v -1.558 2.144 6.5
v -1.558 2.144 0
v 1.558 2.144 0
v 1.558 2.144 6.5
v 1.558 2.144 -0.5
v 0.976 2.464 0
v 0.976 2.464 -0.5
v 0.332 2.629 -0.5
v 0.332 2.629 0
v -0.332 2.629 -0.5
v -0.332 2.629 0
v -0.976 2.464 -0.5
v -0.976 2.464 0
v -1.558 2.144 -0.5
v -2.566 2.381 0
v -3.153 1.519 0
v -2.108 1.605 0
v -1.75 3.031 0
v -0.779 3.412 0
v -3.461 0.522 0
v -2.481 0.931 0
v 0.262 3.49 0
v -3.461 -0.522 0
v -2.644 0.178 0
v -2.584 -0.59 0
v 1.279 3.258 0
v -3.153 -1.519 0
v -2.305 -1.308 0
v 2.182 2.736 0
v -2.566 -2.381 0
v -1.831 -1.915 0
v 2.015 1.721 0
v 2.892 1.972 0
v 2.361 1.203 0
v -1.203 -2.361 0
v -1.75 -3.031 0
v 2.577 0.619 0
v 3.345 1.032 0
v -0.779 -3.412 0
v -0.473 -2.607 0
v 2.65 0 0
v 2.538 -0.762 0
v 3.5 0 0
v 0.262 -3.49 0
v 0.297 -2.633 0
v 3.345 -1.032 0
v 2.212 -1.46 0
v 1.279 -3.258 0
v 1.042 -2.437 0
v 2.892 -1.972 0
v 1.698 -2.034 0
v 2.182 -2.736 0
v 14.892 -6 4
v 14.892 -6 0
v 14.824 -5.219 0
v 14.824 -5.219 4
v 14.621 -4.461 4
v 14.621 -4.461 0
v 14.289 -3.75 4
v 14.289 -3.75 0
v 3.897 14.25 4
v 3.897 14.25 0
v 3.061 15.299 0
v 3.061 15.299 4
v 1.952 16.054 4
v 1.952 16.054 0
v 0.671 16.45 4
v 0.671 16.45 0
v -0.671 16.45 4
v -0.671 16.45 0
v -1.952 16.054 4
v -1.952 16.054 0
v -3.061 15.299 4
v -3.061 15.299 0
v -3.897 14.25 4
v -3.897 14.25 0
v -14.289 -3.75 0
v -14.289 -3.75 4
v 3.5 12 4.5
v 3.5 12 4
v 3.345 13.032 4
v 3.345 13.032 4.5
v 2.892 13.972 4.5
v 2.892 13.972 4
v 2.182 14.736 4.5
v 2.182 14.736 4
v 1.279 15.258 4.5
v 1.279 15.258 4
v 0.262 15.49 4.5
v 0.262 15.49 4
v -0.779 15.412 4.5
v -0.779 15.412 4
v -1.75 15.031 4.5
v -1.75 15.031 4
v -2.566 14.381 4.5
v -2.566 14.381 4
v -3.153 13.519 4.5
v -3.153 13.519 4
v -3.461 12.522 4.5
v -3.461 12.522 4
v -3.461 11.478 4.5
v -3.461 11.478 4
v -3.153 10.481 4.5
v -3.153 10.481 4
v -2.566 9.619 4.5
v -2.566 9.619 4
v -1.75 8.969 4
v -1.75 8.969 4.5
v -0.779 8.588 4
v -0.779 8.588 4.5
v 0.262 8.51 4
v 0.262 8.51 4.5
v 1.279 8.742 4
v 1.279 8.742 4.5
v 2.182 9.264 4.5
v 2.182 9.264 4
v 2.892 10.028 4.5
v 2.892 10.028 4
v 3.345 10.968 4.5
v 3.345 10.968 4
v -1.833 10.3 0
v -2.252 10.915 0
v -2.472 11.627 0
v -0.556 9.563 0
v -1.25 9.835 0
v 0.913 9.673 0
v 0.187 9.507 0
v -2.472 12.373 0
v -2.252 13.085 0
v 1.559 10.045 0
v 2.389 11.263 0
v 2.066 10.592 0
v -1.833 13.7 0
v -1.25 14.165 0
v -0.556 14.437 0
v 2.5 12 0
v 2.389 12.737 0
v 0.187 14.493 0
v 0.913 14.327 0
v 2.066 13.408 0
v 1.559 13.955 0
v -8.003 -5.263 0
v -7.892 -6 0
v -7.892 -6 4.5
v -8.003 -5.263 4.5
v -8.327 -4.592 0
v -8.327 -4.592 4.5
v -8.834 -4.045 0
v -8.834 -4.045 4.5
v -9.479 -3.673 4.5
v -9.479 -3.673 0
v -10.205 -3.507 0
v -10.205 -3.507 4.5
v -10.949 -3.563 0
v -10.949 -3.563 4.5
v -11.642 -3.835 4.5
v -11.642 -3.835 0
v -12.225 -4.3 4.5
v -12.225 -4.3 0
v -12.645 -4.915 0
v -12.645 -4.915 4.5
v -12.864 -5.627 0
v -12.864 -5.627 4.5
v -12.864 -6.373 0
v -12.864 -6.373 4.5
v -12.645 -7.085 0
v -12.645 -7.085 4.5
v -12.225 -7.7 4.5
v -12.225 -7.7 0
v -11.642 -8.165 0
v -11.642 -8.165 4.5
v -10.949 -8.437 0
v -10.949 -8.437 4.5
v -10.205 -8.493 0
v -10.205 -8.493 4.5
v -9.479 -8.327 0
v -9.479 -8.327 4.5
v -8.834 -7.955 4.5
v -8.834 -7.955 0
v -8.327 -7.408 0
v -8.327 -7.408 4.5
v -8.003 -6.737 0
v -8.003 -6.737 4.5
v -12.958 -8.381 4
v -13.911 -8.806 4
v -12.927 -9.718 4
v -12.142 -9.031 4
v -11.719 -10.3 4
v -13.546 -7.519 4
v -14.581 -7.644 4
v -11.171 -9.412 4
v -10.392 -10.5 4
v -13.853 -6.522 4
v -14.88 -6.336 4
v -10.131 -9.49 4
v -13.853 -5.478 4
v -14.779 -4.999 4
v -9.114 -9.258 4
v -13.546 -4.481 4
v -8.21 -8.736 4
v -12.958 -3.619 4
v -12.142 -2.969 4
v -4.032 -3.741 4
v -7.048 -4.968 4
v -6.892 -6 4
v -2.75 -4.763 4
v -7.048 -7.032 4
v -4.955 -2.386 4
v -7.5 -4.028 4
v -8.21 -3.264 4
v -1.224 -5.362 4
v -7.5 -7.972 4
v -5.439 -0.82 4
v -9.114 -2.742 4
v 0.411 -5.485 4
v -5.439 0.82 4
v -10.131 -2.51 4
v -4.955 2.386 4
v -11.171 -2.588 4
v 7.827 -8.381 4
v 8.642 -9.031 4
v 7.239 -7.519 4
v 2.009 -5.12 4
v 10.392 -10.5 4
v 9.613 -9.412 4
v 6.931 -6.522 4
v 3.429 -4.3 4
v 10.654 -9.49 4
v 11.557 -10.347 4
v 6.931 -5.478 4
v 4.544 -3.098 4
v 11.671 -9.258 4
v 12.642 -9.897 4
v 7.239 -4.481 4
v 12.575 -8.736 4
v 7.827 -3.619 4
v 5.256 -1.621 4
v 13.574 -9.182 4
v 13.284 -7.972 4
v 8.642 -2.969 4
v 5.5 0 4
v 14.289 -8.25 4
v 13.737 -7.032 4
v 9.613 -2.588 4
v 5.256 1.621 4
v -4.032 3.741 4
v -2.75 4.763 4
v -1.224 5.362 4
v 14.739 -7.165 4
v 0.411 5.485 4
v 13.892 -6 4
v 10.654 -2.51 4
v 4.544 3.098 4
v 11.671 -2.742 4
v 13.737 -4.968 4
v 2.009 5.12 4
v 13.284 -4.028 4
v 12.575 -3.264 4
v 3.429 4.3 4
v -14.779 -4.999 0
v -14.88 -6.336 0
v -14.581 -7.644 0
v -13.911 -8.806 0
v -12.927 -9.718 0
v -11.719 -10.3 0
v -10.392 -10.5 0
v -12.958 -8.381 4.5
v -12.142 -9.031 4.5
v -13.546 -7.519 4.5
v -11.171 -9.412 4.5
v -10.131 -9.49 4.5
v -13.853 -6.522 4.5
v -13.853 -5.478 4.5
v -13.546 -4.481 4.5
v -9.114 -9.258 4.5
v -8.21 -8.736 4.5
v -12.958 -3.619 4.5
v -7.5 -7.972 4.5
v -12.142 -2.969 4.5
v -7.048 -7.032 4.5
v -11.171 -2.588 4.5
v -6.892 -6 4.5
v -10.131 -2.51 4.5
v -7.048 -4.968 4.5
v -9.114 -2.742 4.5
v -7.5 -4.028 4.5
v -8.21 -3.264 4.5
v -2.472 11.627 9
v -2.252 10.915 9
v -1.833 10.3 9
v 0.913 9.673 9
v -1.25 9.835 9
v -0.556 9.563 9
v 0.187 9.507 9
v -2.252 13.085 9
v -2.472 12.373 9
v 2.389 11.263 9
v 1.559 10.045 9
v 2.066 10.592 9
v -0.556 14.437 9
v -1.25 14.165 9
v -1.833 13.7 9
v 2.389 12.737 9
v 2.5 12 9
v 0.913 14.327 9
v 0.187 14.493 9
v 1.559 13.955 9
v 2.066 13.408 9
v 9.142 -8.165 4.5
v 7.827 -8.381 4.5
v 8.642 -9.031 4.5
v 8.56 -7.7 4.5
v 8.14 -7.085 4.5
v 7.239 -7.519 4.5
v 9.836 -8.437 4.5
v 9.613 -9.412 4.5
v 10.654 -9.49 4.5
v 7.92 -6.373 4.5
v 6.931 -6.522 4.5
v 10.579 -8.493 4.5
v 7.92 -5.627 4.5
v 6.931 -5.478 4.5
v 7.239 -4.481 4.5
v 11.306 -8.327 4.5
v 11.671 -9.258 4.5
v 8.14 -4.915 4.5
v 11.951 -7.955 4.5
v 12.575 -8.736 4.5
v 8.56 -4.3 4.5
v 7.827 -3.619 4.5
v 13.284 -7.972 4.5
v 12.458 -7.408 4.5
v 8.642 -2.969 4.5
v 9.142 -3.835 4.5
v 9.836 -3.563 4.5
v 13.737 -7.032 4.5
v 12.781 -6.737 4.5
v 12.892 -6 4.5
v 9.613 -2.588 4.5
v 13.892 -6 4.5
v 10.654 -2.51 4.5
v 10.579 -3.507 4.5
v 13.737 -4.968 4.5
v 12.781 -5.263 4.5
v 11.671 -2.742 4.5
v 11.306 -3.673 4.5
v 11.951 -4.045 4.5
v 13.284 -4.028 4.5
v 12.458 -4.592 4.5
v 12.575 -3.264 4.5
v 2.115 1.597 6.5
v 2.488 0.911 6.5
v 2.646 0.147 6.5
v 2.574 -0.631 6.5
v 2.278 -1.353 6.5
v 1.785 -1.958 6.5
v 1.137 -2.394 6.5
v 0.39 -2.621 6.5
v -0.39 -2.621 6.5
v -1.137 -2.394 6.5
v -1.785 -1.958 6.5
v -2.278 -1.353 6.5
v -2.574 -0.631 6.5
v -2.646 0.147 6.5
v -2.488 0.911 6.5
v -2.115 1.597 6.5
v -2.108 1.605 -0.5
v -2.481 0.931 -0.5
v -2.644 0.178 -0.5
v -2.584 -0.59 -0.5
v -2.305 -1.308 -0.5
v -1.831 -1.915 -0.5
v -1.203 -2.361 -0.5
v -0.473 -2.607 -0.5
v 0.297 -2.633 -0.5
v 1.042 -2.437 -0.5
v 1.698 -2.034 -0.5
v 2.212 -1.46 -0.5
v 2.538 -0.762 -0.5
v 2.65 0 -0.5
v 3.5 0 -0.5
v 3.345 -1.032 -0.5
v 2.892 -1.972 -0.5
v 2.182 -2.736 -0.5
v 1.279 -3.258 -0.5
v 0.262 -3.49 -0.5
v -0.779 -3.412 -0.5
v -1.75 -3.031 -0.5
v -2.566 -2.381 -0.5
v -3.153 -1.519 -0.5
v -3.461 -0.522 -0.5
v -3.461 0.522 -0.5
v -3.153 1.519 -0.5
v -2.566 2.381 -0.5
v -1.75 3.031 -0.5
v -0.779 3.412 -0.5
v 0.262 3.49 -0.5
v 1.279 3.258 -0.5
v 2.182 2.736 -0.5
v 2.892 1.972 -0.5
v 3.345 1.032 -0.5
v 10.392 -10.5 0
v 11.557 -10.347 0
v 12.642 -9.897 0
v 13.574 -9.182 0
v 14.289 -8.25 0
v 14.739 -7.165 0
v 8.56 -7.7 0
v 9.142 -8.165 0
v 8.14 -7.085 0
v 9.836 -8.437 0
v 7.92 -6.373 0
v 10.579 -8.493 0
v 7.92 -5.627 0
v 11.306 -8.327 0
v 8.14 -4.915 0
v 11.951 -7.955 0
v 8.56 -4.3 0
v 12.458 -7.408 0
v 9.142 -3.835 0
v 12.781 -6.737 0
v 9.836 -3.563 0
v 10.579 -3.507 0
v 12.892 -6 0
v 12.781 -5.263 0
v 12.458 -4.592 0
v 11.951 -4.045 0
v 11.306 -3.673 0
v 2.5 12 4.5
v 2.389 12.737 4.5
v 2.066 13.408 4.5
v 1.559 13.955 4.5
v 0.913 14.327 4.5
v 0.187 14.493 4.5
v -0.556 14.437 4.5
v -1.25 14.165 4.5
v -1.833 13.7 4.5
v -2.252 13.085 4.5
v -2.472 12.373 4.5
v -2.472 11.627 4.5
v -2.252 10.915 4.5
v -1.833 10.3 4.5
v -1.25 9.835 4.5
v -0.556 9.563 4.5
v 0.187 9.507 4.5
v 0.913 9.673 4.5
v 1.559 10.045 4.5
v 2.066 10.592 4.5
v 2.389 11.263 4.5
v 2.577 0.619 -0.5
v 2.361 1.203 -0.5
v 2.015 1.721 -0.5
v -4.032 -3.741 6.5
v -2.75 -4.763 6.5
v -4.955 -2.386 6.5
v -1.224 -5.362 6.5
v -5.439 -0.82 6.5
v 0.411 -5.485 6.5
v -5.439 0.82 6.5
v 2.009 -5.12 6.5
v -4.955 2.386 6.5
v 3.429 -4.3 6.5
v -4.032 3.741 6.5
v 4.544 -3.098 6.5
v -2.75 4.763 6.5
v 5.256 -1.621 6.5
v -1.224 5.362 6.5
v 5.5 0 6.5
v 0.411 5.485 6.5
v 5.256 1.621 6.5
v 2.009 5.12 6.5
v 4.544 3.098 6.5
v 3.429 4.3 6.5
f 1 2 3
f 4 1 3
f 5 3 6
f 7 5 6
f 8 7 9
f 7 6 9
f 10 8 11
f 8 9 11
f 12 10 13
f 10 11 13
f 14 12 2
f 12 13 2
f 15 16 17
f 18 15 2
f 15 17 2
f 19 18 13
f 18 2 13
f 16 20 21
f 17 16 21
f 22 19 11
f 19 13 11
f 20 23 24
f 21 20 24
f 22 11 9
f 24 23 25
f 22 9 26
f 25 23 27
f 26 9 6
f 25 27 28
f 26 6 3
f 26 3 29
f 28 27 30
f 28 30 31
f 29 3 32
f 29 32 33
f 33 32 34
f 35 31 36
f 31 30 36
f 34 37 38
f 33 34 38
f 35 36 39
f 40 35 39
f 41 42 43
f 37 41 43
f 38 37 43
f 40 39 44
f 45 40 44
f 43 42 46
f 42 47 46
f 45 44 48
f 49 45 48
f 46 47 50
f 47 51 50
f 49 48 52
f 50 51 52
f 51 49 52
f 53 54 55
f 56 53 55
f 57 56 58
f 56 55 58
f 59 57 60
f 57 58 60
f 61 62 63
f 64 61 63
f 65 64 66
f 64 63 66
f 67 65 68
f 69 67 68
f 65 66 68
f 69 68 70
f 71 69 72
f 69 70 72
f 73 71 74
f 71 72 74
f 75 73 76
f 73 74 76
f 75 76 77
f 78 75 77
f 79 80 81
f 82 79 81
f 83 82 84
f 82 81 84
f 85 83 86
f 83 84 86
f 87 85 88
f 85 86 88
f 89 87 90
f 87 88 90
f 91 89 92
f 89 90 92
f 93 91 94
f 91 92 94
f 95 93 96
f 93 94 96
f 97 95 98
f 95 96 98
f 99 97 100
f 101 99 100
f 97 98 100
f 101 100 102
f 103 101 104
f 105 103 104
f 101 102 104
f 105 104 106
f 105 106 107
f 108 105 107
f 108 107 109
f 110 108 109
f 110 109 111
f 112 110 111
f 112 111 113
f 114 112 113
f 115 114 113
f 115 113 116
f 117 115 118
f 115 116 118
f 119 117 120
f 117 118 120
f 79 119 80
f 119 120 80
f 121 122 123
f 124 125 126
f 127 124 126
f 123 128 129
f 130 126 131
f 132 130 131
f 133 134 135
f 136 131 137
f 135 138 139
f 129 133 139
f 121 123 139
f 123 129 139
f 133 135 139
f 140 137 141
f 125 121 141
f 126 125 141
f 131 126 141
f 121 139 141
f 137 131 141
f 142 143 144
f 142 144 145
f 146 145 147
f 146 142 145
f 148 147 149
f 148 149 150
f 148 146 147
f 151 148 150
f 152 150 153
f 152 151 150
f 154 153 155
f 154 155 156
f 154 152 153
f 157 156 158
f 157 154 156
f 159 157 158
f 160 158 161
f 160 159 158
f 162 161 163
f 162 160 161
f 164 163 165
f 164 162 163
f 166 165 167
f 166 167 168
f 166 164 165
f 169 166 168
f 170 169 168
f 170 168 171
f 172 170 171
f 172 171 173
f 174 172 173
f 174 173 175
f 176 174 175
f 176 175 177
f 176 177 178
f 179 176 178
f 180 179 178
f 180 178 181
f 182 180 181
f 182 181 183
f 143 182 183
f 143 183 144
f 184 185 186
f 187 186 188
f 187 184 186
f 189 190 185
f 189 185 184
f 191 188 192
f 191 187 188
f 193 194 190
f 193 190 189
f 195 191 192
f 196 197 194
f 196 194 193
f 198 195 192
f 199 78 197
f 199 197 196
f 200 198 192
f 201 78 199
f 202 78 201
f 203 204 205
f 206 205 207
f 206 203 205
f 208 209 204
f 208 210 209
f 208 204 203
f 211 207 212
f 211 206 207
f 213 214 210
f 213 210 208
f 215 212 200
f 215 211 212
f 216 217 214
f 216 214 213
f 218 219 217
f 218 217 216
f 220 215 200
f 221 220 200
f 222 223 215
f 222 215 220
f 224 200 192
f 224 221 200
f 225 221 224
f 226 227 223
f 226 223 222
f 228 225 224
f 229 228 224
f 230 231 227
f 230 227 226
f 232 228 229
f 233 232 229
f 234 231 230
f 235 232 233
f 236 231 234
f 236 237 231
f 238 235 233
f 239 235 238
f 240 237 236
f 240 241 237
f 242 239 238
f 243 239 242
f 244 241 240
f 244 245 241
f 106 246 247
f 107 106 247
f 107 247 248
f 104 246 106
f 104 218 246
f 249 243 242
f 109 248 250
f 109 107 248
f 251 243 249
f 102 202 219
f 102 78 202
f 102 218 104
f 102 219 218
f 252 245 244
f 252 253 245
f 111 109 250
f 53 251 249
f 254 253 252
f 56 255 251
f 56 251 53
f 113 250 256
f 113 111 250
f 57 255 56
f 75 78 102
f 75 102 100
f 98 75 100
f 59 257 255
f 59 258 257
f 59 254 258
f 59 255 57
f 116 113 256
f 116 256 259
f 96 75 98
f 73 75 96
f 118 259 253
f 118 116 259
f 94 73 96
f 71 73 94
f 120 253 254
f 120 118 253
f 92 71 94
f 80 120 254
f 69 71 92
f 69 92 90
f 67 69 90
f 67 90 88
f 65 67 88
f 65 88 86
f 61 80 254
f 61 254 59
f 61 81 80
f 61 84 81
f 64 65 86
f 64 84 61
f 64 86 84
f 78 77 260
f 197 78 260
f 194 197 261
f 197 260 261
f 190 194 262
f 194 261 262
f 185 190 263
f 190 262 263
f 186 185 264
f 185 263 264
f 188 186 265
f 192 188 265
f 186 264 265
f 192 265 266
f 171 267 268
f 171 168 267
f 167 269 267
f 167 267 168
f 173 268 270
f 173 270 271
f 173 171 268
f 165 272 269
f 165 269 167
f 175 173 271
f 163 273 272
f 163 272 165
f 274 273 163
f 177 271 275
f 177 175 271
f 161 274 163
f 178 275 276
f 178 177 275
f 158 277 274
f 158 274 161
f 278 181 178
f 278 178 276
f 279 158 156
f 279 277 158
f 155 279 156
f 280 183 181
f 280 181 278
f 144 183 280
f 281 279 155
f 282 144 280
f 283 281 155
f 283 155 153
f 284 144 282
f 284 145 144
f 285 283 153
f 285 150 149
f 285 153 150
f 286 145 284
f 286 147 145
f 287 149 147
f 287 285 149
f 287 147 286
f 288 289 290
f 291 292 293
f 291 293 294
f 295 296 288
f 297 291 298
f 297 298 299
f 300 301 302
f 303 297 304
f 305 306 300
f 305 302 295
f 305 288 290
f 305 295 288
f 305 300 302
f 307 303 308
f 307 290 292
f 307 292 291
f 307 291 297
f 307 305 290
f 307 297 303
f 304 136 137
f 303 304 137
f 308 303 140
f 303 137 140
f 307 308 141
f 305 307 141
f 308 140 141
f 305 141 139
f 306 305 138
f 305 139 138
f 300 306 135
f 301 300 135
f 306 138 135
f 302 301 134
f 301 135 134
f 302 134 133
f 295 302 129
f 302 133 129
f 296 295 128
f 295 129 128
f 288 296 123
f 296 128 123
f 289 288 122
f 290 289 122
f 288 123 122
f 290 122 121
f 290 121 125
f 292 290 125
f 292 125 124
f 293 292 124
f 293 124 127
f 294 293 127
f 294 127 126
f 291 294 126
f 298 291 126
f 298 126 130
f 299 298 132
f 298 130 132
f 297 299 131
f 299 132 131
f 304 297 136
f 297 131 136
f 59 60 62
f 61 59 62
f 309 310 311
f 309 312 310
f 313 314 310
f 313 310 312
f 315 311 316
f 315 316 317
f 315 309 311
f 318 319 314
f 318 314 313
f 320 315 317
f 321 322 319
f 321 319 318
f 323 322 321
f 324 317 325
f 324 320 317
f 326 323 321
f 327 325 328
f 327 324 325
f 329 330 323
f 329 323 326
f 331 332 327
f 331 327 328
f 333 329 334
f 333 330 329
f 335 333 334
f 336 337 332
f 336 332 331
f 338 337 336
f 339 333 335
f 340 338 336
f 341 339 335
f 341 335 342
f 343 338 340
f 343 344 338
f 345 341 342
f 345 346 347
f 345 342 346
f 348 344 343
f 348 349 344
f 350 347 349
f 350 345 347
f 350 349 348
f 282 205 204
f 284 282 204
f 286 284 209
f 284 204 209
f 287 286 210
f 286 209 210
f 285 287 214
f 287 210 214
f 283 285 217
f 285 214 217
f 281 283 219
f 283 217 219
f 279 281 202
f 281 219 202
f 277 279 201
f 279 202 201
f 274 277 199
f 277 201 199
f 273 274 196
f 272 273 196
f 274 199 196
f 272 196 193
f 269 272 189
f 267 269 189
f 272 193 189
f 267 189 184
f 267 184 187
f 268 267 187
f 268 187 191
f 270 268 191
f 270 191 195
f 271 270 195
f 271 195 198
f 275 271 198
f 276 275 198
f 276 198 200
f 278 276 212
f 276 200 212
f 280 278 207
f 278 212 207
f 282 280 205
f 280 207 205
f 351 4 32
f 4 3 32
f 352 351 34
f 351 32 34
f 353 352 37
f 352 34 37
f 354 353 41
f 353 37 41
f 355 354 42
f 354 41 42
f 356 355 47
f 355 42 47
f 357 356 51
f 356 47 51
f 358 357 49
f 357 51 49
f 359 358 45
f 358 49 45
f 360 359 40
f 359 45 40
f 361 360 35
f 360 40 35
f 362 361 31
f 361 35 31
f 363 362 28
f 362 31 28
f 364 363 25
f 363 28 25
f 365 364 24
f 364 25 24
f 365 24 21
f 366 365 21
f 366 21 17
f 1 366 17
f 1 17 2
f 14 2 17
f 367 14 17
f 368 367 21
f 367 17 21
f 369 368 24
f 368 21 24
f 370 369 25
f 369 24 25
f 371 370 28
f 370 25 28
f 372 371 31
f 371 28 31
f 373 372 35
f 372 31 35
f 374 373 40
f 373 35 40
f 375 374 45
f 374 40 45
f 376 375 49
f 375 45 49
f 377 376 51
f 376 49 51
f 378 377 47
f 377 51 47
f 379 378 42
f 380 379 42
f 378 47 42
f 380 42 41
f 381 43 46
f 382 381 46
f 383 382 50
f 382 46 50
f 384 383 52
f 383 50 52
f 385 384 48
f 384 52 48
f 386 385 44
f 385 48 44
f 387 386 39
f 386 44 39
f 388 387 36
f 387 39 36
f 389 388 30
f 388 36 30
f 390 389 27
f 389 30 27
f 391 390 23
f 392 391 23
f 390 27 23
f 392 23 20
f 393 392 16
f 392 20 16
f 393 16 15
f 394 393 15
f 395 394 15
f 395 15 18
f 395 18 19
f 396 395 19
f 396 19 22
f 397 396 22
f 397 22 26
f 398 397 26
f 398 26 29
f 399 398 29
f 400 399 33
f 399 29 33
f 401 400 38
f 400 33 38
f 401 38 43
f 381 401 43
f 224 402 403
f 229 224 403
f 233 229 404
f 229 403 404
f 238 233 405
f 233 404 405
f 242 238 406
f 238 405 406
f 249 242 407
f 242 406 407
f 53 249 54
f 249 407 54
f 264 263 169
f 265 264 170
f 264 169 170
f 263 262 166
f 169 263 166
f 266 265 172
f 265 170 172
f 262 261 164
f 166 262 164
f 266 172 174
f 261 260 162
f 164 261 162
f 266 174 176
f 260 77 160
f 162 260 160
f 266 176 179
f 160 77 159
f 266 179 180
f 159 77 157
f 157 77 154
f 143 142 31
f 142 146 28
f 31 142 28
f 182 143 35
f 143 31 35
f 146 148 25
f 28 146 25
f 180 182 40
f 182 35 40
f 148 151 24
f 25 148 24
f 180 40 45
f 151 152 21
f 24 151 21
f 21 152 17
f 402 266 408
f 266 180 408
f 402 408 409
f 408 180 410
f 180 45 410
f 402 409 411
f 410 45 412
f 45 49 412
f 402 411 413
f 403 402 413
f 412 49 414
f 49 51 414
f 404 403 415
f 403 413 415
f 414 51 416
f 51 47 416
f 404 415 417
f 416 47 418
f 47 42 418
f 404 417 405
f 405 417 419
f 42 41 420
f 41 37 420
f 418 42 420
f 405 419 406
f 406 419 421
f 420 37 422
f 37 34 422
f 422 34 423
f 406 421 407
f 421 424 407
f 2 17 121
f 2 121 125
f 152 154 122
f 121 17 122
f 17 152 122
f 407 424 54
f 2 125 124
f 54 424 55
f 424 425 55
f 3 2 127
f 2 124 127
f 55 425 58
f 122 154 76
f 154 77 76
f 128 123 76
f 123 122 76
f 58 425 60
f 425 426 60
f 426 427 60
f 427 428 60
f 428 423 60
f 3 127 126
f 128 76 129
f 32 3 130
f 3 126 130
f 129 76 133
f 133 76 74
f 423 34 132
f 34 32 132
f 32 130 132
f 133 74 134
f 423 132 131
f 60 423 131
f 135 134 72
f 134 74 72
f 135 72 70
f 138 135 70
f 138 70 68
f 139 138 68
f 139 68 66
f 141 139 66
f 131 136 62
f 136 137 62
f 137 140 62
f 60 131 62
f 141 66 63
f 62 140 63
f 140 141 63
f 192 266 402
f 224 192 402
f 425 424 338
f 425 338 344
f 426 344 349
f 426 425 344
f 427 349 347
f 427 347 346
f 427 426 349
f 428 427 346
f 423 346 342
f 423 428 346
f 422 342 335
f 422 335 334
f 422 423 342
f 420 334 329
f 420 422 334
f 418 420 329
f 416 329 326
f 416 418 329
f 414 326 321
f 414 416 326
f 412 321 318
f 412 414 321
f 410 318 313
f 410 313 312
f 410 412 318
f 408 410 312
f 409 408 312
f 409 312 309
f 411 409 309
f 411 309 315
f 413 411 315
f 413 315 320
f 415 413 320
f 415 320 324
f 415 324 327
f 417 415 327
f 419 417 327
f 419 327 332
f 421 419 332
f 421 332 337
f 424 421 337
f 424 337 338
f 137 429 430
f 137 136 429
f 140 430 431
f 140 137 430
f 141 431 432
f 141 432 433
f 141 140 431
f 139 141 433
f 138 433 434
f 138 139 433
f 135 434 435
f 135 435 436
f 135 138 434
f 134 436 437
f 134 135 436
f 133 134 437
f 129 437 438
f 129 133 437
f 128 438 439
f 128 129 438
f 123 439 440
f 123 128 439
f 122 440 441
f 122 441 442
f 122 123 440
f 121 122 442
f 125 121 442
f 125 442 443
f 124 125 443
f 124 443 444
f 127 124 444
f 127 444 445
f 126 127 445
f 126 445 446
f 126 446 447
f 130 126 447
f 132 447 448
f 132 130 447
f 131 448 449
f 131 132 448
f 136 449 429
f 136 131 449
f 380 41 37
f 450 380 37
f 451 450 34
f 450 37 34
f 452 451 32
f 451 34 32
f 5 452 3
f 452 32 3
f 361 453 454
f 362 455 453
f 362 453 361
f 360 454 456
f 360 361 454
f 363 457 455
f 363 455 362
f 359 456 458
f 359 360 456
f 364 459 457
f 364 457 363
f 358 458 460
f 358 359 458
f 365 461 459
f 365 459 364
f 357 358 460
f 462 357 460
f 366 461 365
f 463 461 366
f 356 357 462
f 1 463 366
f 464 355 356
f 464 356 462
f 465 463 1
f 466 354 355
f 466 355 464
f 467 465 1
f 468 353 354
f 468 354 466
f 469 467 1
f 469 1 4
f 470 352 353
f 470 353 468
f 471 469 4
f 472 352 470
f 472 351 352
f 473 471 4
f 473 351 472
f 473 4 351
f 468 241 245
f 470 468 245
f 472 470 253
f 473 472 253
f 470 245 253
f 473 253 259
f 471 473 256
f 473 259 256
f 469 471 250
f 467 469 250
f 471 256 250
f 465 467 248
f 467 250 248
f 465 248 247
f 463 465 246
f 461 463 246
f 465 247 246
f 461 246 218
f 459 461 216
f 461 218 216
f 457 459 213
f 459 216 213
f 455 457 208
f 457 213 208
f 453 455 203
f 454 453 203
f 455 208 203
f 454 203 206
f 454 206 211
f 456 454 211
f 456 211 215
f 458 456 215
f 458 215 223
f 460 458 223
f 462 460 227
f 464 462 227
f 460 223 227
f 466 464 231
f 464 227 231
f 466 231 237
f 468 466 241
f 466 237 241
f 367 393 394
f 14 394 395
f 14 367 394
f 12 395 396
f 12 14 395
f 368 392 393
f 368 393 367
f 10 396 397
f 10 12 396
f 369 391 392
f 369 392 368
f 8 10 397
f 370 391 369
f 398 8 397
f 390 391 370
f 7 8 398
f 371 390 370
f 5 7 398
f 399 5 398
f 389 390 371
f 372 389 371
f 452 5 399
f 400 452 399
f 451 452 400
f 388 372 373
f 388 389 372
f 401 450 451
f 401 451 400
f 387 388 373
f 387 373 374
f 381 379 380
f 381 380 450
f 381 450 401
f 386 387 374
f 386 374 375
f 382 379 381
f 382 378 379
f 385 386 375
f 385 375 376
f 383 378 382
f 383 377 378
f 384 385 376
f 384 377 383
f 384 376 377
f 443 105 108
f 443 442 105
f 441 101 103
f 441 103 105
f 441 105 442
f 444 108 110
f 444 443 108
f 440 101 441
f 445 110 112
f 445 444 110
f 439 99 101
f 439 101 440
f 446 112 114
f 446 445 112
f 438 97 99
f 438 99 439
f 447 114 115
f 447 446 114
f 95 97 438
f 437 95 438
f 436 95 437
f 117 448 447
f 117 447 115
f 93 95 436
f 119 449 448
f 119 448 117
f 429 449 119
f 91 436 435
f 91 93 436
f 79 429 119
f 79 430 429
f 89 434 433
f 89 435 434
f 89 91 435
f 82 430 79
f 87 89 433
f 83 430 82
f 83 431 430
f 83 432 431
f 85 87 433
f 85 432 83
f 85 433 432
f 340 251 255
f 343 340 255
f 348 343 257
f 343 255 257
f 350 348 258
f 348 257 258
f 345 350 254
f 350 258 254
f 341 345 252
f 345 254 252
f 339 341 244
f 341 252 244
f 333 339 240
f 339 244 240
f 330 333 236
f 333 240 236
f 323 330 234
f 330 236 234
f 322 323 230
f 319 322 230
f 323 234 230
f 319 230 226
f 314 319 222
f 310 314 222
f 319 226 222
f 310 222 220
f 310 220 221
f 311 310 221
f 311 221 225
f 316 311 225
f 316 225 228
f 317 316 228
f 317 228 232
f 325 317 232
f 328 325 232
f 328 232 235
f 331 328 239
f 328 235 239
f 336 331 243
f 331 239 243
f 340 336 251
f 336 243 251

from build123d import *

# Parameters (mm, degrees)
F0_R     = 5.5000004034
F0_R_2   = 2.5
F1_DEPTH = 4
F2_R     = 5.5000004034
F3_DEPTH = 2.5
F4_R     = 3.5
F5_DEPTH = 0.5
F2_R_2   = 3.5
F2_R_3   = 2.5
F6_DEPTH = 0.5
F7_DEPTH = 9


# Not quite as in the source:
# - a feature names something its author has since deleted; it is built from what else it names


with BuildPart() as f1:
    # F0 (on Top) → F1 (new body)
    with BuildSketch(Plane.XY):
        with BuildLine():
            ThreePointArc((-14.2894193359, -3.7500009242), (-9.2276193118, -1.6533344658), (-5.8923048983, -6.0000007153))
            ThreePointArc((-5.8923048983, -6.0000007153), (-7.2103242734, -9.1819811212), (-10.3923045885, -10.5000007153))
            Line((-10.3923045885, -10.5000007153), (10.3923063941, -10.4999992847))
            ThreePointArc((10.3923063941, -10.4999992847), (6.4951930666, -3.7500013262), (14.2894194379, -3.7500019077))
            Line((14.2894194379, -3.7500019077), (3.8971161501, 14.2500004833))
            ThreePointArc((3.8971161501, 14.2500004833), (4.3466679585, 13.1646861286), (4.5000017068, 12.0000004034))
            ThreePointArc((4.5000017068, 12.0000004034), (-1.1646852817, 7.6533330781), (-3.8971148091, 14.2500007515))
            Line((-3.8971148091, 14.2500007515), (-14.2894193359, -3.7500009242))
        make_face()
        Circle(F0_R, mode=Mode.SUBTRACT)
        Circle(F0_R)
        with BuildLine():
            ThreePointArc((1.5576309186, 2.1438950351), (2.3611672891, 1.2030748243), (2.65, 0))
            ThreePointArc((2.65, 0), (-1.2030748243, -2.3611672891), (-1.5576309186, 2.1438950351))
            ThreePointArc((-1.5576309186, 2.1438950351), (0, 2.65), (1.5576309186, 2.1438950351))
        make_face(mode=Mode.SUBTRACT)
        with BuildLine():
            ThreePointArc((3.8971161501, 14.2500004833), (7.479e-07, 16.5000015172), (-3.8971148091, 14.2500007515))
            ThreePointArc((-3.8971148091, 14.2500007515), (-1.1646852817, 7.6533330781), (4.5000017068, 12.0000004034))
            ThreePointArc((4.5000017068, 12.0000004034), (4.3466679585, 13.1646861286), (3.8971161501, 14.2500004833))
        make_face()
        with Locations((5.931e-07, 12.0000004034)):
            Circle(F0_R_2, mode=Mode.SUBTRACT)
        with BuildLine():
            ThreePointArc((-10.3923045885, -10.5000007153), (-7.2103242734, -9.1819811212), (-5.8923048983, -6.0000007153))
            ThreePointArc((-5.8923048983, -6.0000007153), (-9.2276193118, -1.6533344658), (-14.2894193359, -3.7500009242))
            ThreePointArc((-14.2894193359, -3.7500009242), (-14.2894190776, -8.2500009539), (-10.3923045885, -10.5000007153))
        make_face()
        with Locations((-10.3923048983, -6.0000007153)):
            Circle(F0_R_2, mode=Mode.SUBTRACT)
        with BuildLine():
            ThreePointArc((14.2894194379, -3.7500019077), (6.4951930666, -3.7500013262), (10.3923063941, -10.4999992847))
            ThreePointArc((10.3923063941, -10.4999992847), (13.5742856976, -9.1819801095), (14.8923046537, -6.0000007153))
            ThreePointArc((14.8923046537, -6.0000007153), (14.7389709921, -4.8353156487), (14.2894194379, -3.7500019077))
        make_face()
        with Locations((10.3923060844, -6.0000007153)):
            Circle(F0_R_2, mode=Mode.SUBTRACT)
        with BuildLine():
            Line((-1.5576309186, 2.1438950351), (1.5576309186, 2.1438950351))
            ThreePointArc((1.5576309186, 2.1438950351), (0, 2.65), (-1.5576309186, 2.1438950351))
        make_face()
    extrude(amount=F1_DEPTH)

    # F2 (on face) → F3 (join)
    with BuildSketch(Plane.XY.offset(4)):
        Circle(F2_R)
        with BuildLine():
            ThreePointArc((1.5576309186, 2.1438950351), (0, -2.65), (-1.5576309186, 2.1438950351))
            Line((-1.5576309186, 2.1438950351), (1.5576309186, 2.1438950351))
        make_face(mode=Mode.SUBTRACT)
    extrude(amount=F3_DEPTH)

    # F2 (on face) → F6 (join)
    with BuildSketch(Plane.XY.offset(4)):
        with Locations((5.931e-07, 12.0000004034)):
            Circle(F2_R_2)
        with Locations((5.931e-07, 12.0000004034)):
            Circle(F2_R_3, mode=Mode.SUBTRACT)
        with Locations((-10.3923048983, -6.0000007153)):
            Circle(F2_R_2)
        with Locations((-10.3923048983, -6.0000007153)):
            Circle(F2_R_3, mode=Mode.SUBTRACT)
        with Locations((10.3923060844, -6.0000007153)):
            Circle(F2_R_2)
        with Locations((10.3923060844, -6.0000007153)):
            Circle(F2_R_3, mode=Mode.SUBTRACT)
    extrude(amount=F6_DEPTH)


with BuildPart() as f5:
    # F4 (on face) → F5 (new body)
    with BuildSketch(Plane(origin=(0, 0, 0), x_dir=(1, 0, 0), z_dir=(0, 0, -1))):
        Circle(F4_R)
        with BuildLine():
            ThreePointArc((-1.5576309186, -2.1438950351), (-1.2030748243, 2.3611672891), (2.65, 0))
            ThreePointArc((2.65, 0), (2.3611672891, -1.2030748243), (1.5576309186, -2.1438950351))
            ThreePointArc((1.5576309186, -2.1438950351), (0, -2.65), (-1.5576309186, -2.1438950351))
        make_face(mode=Mode.SUBTRACT)
    extrude(amount=F5_DEPTH)


with BuildPart() as f7:
    # F0 (on Top) → F7 (new body)
    with BuildSketch(Plane.XY):
        with Locations((5.931e-07, 12.0000004034)):
            Circle(F0_R_2)
    extrude(amount=F7_DEPTH)


solid = Compound([f1.part, f5.part, f7.part])
